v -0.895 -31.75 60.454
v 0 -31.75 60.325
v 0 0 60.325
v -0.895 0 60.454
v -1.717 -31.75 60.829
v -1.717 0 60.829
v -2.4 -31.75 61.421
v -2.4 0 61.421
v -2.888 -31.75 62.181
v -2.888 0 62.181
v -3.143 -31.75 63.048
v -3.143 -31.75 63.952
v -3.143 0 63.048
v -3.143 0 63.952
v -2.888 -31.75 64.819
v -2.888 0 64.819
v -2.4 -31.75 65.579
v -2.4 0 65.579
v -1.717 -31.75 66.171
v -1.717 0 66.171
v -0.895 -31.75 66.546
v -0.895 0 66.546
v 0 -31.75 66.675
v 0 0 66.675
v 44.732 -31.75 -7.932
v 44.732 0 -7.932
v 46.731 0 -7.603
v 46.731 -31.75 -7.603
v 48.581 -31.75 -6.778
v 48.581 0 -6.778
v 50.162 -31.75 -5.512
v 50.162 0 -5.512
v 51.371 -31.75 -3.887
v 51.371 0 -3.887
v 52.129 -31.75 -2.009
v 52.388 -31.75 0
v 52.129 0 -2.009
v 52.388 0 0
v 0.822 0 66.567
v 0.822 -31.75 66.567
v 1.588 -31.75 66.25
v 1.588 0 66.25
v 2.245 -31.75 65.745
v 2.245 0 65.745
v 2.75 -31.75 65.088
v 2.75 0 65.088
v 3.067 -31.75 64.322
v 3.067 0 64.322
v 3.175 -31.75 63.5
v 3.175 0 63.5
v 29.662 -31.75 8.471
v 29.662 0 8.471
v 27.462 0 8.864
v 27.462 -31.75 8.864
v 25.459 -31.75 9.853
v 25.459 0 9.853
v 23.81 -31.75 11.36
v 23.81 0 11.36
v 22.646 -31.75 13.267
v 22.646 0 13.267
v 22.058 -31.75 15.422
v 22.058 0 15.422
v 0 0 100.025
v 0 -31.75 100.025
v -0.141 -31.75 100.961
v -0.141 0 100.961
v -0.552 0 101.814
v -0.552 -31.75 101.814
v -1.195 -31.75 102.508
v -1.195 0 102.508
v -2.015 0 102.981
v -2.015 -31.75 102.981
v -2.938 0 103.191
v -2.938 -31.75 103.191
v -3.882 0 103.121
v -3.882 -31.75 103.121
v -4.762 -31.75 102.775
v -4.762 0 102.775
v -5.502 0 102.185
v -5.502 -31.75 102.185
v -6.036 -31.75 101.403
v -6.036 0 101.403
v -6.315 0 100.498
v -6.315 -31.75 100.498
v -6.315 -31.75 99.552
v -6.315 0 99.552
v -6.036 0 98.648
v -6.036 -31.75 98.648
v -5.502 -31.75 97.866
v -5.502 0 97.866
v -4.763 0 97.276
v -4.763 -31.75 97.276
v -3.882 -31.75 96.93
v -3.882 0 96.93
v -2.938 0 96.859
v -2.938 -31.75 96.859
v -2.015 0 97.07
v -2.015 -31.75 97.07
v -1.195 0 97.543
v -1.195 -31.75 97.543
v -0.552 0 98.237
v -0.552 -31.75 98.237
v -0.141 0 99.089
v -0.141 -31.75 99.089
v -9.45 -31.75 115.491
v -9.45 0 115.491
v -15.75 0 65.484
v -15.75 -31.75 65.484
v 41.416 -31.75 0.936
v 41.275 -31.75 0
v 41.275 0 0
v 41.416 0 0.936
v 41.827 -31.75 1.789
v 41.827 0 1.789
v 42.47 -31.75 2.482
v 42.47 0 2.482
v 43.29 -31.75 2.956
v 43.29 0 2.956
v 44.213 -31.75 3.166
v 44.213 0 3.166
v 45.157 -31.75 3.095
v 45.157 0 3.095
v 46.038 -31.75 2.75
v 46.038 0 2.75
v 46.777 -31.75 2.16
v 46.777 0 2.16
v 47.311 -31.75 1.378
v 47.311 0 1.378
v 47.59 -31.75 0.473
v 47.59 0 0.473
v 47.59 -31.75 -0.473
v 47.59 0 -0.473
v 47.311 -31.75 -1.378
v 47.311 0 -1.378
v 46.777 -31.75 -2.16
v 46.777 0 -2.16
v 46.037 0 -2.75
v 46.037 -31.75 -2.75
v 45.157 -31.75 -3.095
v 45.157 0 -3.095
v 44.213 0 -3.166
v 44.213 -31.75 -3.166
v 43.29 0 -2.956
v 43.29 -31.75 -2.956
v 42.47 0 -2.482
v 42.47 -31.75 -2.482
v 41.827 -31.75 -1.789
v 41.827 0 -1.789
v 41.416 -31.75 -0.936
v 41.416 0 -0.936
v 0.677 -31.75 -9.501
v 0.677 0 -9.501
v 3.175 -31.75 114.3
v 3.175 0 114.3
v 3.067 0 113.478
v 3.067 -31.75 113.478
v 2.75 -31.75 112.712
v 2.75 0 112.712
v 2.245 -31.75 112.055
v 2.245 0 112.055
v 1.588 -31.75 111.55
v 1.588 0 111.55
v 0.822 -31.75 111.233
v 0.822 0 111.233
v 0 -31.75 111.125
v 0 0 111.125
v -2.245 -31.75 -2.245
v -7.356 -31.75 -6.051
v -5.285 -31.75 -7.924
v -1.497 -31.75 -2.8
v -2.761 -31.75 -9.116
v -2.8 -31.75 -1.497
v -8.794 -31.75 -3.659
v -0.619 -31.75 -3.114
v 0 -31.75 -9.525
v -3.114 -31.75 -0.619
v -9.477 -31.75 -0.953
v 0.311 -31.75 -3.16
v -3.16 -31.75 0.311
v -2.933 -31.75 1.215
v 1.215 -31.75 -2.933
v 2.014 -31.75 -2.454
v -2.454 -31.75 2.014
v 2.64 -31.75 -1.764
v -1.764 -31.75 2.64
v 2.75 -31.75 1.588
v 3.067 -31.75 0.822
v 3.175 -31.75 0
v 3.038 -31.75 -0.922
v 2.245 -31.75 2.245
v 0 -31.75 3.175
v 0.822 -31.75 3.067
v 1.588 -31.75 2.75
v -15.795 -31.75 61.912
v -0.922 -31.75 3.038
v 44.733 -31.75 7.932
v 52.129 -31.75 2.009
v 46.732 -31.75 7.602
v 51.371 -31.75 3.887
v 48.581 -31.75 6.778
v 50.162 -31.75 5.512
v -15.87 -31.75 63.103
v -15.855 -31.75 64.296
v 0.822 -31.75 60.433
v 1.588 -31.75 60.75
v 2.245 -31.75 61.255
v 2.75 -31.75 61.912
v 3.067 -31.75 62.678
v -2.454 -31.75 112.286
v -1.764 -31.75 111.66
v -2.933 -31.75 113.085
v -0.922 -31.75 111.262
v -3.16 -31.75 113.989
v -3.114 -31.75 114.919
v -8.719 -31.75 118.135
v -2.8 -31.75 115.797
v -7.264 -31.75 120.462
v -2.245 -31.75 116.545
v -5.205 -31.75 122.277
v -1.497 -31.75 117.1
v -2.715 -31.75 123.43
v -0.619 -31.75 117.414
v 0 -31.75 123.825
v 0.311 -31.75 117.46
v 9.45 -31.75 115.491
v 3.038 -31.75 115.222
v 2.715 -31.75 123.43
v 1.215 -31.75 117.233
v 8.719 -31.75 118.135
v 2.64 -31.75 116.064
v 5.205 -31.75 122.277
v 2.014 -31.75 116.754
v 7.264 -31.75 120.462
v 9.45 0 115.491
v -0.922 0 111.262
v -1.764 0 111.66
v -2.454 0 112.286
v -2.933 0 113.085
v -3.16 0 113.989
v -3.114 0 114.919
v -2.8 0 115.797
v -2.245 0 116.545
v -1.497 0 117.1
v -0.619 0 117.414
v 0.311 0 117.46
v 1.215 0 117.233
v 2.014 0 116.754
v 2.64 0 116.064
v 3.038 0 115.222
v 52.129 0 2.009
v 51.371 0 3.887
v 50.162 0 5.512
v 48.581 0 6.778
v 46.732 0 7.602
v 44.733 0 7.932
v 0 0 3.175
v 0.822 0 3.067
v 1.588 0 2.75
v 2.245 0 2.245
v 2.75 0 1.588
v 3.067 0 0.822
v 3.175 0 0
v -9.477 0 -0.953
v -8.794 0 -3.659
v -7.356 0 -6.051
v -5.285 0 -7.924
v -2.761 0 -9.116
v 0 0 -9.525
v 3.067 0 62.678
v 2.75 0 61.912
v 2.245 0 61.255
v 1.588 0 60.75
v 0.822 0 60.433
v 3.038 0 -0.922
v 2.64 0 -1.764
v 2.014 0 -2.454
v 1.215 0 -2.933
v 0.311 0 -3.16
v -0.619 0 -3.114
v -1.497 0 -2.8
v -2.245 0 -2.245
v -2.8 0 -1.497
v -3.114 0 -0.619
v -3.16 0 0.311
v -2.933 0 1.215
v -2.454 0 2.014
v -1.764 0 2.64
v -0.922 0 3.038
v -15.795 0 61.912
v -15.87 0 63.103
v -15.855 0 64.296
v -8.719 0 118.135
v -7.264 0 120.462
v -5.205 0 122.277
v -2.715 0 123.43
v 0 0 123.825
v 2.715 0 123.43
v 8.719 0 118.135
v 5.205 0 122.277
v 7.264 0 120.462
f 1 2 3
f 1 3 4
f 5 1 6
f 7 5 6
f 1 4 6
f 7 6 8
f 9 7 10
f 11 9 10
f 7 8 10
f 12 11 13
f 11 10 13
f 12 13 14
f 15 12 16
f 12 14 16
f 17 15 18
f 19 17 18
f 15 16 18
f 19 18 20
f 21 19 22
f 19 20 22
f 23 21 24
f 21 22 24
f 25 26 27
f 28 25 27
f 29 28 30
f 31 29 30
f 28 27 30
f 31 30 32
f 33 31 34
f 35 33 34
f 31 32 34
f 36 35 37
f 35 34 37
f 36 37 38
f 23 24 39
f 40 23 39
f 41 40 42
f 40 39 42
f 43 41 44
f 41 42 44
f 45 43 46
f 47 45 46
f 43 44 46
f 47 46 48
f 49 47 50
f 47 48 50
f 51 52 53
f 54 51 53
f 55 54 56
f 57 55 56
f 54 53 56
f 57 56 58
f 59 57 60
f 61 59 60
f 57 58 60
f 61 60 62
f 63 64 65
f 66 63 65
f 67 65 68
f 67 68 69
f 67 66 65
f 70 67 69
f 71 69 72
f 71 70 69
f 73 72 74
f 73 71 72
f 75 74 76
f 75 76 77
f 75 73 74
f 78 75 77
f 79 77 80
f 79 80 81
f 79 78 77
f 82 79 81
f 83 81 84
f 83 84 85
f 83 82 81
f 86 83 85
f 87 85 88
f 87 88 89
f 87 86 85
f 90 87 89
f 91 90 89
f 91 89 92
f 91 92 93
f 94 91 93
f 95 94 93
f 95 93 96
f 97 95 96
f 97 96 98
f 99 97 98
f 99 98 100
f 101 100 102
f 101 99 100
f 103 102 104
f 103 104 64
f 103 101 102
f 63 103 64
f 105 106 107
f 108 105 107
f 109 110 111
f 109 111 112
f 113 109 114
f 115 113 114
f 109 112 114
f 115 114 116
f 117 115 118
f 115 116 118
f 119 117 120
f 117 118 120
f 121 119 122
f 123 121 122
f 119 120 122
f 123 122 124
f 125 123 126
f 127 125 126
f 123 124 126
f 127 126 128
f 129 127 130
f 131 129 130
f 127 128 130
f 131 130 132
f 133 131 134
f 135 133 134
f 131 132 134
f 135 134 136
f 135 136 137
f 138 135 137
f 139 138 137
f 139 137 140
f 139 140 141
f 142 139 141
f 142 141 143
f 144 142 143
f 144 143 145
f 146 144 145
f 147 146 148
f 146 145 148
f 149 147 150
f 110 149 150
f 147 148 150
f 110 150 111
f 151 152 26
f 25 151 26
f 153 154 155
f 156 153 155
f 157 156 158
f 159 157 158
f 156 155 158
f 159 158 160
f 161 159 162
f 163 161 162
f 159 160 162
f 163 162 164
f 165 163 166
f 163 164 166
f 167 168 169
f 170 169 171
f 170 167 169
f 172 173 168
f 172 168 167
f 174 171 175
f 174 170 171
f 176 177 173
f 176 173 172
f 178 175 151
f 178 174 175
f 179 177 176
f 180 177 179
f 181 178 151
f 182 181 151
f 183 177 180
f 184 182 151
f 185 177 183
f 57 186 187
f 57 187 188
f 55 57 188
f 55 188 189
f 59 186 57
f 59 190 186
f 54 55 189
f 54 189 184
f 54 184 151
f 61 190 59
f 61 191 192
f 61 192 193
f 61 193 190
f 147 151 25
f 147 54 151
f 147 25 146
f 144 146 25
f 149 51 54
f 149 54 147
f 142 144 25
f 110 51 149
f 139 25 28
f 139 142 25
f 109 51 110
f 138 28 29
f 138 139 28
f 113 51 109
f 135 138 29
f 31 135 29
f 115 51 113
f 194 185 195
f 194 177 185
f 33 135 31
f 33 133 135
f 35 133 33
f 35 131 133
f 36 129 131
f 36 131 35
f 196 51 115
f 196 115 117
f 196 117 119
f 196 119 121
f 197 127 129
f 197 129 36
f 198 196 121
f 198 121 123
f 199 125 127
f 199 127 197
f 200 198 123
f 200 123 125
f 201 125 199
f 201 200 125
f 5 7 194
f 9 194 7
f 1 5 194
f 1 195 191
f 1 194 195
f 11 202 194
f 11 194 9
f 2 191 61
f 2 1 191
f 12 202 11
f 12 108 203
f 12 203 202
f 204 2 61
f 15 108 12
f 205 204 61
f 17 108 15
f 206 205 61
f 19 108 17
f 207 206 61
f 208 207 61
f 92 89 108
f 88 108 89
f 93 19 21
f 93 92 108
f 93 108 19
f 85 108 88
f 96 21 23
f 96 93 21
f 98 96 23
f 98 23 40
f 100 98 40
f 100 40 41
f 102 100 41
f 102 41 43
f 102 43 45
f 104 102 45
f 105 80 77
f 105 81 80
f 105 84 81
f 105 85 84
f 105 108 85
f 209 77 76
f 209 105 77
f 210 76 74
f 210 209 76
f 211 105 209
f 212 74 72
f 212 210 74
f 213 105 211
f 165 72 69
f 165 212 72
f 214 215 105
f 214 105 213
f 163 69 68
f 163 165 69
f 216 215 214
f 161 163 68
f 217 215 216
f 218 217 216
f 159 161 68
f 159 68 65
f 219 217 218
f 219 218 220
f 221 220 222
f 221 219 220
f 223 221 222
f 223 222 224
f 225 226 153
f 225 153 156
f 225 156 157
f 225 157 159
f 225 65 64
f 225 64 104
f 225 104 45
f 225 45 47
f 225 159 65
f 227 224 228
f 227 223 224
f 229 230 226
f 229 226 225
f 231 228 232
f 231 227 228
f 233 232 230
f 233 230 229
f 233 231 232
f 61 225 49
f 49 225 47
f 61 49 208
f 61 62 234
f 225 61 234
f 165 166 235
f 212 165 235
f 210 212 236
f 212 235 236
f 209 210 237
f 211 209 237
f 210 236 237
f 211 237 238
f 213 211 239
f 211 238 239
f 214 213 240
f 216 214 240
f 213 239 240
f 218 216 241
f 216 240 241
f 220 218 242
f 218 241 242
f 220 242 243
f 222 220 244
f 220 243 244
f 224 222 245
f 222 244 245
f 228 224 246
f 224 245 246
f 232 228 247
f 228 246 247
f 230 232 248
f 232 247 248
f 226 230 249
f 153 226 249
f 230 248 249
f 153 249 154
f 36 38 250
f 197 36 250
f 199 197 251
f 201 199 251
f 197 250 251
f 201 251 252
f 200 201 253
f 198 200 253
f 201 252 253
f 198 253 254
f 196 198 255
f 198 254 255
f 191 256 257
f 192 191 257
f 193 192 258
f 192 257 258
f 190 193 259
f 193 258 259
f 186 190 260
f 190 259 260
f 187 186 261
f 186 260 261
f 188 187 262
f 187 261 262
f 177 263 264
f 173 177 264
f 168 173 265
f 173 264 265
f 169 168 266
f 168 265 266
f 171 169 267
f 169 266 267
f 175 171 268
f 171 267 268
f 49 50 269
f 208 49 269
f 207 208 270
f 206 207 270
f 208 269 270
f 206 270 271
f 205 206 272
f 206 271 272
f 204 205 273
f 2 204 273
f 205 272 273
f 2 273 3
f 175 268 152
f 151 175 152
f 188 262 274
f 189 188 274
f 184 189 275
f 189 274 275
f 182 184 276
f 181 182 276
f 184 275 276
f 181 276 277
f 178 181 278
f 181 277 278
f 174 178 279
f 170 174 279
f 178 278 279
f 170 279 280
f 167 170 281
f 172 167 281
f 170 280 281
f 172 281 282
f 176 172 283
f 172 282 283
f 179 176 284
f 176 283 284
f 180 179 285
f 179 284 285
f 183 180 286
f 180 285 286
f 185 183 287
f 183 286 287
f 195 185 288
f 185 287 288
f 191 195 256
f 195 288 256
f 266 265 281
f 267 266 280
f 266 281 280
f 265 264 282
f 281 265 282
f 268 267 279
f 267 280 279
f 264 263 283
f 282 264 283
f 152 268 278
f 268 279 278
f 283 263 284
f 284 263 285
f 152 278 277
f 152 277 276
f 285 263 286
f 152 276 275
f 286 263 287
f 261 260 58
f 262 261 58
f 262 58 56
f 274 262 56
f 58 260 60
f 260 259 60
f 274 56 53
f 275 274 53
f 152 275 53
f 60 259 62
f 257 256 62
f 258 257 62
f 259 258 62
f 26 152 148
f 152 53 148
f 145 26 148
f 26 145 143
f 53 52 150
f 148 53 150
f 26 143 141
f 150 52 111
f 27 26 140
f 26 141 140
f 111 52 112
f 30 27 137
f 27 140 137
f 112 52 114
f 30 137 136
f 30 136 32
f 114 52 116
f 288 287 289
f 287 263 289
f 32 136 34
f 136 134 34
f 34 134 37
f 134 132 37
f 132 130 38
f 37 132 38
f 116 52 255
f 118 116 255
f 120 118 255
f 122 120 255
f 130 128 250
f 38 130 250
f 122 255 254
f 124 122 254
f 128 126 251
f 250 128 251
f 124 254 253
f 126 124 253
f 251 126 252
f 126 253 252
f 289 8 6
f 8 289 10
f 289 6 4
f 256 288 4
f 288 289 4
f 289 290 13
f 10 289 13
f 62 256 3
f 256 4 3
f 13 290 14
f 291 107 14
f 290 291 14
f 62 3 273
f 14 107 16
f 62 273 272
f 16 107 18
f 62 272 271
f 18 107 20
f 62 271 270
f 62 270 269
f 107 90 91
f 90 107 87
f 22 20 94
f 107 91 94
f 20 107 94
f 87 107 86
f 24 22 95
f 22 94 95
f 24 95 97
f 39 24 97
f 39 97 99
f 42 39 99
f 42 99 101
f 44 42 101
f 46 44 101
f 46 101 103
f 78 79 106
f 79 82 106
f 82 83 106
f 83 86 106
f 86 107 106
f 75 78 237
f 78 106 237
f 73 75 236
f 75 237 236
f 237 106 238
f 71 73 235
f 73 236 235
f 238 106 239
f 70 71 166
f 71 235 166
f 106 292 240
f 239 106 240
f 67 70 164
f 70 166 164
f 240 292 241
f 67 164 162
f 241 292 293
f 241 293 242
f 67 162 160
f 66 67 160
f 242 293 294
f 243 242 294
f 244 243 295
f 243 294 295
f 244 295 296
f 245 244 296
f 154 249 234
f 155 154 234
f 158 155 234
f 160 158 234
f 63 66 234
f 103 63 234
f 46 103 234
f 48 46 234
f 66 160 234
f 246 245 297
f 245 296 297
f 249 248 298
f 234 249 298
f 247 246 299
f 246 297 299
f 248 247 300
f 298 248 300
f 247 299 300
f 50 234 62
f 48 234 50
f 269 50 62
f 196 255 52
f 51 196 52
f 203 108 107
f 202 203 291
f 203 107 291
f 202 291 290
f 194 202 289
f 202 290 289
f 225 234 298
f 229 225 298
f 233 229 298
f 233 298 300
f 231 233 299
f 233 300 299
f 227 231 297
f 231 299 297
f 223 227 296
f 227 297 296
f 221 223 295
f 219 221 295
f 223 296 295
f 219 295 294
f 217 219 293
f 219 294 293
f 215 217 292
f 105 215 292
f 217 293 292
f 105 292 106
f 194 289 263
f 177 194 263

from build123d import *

# Parameters (mm, degrees)
F0_R     = 3.175
F1_DEPTH = 31.75


with BuildPart() as f1:
    # F0 (on Front) → F1 (new body)
    with BuildSketch(Plane.XZ):
        with BuildLine():
            Line((22.0577025061, 15.4224140263), (15.7504882737, 65.484375))
            ThreePointArc((15.7504882737, 65.484375), (15.8438414904, 64.4941387366), (15.875, 63.5))
            ThreePointArc((15.875, 63.5), (11.2253201513, 52.2746798487), (0, 47.625))
            Line((0, 47.625), (0, 9.525))
            ThreePointArc((0, 9.525), (6.7351920908, 6.7351920908), (9.525, 0))
            Line((9.525, 0), (36.5125, 0))
            ThreePointArc((36.5125, 0), (38.9384772185, 5.7120069047), (44.7334821429, 7.9324362036))
            Line((44.7334821429, 7.9324362036), (29.6616113193, 8.4710609247))
            ThreePointArc((29.6616113193, 8.4710609247), (24.5813298898, 10.5484079743), (22.0577025061, 15.4224140263))
        make_face()
        with BuildLine():
            ThreePointArc((9.4502929642, 115.490625), (9.5063048942, 114.896483242), (9.525, 114.3))
            ThreePointArc((9.525, 114.3), (6.7351920908, 107.5648079092), (0, 104.775))
            Line((0, 104.775), (0, 100.0252))
            Line((0, 100.0252), (0, 79.375))
            ThreePointArc((0, 79.375), (10.5003255158, 75.40625), (15.7504882737, 65.484375))
            Line((15.7504882737, 65.484375), (9.4502929642, 115.490625))
        make_face()
        with BuildLine():
            Line((0, 100.0252), (0, 104.775))
            ThreePointArc((0, 104.775), (-7.14375, 107.9998046905), (-9.4502929642, 115.490625))
            Line((-9.4502929642, 115.490625), (-15.7504882737, 65.484375))
            ThreePointArc((-15.7504882737, 65.484375), (-10.5003255158, 75.40625), (0, 79.375))
            Line((0, 79.375), (0, 100.0252))
        make_face()
        with Locations((-3.175, 100.0252)):
            Circle(F0_R, mode=Mode.SUBTRACT)
        with BuildLine():
            ThreePointArc((0, 104.775), (6.7351920908, 107.5648079092), (9.525, 114.3))
            ThreePointArc((9.525, 114.3), (9.5063048942, 114.896483242), (9.4502929642, 115.490625))
            ThreePointArc((9.4502929642, 115.490625), (0, 123.825), (-9.4502929642, 115.490625))
            ThreePointArc((-9.4502929642, 115.490625), (-7.14375, 107.9998046905), (0, 104.775))
        make_face()
        with BuildLine():
            ThreePointArc((3.175, 114.3), (2.2450640303, 112.0549359697), (0, 111.125))
            ThreePointArc((0, 111.125), (-2.2450640303, 116.5450640303), (3.175, 114.3))
        make_face(mode=Mode.SUBTRACT)
        with BuildLine():
            Line((36.5125, 0), (9.525, 0))
            ThreePointArc((9.525, 0), (6.9705567315, -6.4912990883), (0.6773435479, -9.500885786))
            Line((0.6773435479, -9.500885786), (44.7324052746, -7.9324746146))
            ThreePointArc((44.7324052746, -7.9324746146), (38.9380895153, -5.7116327839), (36.5125, 0))
        make_face()
        with BuildLine():
            ThreePointArc((0, 9.525), (-7.063929059, 6.3895642457), (-9.4772553384, -0.9525))
            ThreePointArc((-9.4772553384, -0.9525), (-6.3895642457, -7.063929059), (0, -9.525))
            Line((0, -9.525), (0.6773435479, -9.500885786))
            ThreePointArc((0.6773435479, -9.500885786), (6.9705567315, -6.4912990883), (9.525, 0))
            Line((9.525, 0), (3.175, 0))
            ThreePointArc((3.175, 0), (-2.2450640303, -2.2450640303), (0, 3.175))
            Line((0, 3.175), (0, 9.525))
        make_face()
        with BuildLine():
            ThreePointArc((9.525, 0), (6.7351920908, 6.7351920908), (0, 9.525))
            Line((0, 9.525), (0, 3.175))
            ThreePointArc((0, 3.175), (2.2450640303, 2.2450640303), (3.175, 0))
            Line((3.175, 0), (9.525, 0))
        make_face()
        with BuildLine():
            ThreePointArc((52.3875, 0), (50.1620069047, 5.5115227815), (44.7334821429, 7.9324362036))
            ThreePointArc((44.7334821429, 7.9324362036), (38.9384772185, 5.7120069047), (36.5125, 0))
            ThreePointArc((36.5125, 0), (38.9380895153, -5.7116327839), (44.7324052746, -7.9324746146))
            ThreePointArc((44.7324052746, -7.9324746146), (50.1616327839, -5.5119104847), (52.3875, 0))
        make_face()
        with BuildLine():
            ThreePointArc((47.625, 0), (44.45, -3.175), (41.275, 0))
            ThreePointArc((41.275, 0), (44.45, 3.175), (47.625, 0))
        make_face(mode=Mode.SUBTRACT)
        with BuildLine():
            ThreePointArc((0, 79.375), (-10.5003255158, 75.40625), (-15.7504882737, 65.484375))
            ThreePointArc((-15.7504882737, 65.484375), (-15.8737438155, 63.6997054867), (-15.7954255641, 61.9125))
            ThreePointArc((-15.7954255641, 61.9125), (-10.6492737428, 51.7267849017), (0, 47.625))
            Line((0, 47.625), (0, 60.325))
            ThreePointArc((0, 60.325), (-3.175, 63.5), (0, 66.675))
            Line((0, 66.675), (0, 79.375))
        make_face()
        with BuildLine():
            ThreePointArc((15.875, 63.5), (15.8438414904, 64.4941387366), (15.7504882737, 65.484375))
            ThreePointArc((15.7504882737, 65.484375), (10.5003255158, 75.40625), (0, 79.375))
            Line((0, 79.375), (0, 66.675))
            ThreePointArc((0, 66.675), (2.2450640303, 65.7450640303), (3.175, 63.5))
            ThreePointArc((3.175, 63.5), (2.2450640303, 61.2549359697), (0, 60.325))
            Line((0, 60.325), (0, 47.625))
            ThreePointArc((0, 47.625), (11.2253201513, 52.2746798487), (15.875, 63.5))
        make_face()
        with BuildLine():
            ThreePointArc((0, 47.625), (-10.6492737428, 51.7267849017), (-15.7954255641, 61.9125))
            Line((-15.7954255641, 61.9125), (-9.4772553384, -0.9525))
            ThreePointArc((-9.4772553384, -0.9525), (-7.063929059, 6.3895642457), (0, 9.525))
            Line((0, 9.525), (0, 47.625))
        make_face()
    extrude(amount=F1_DEPTH)


solid = f1.part
